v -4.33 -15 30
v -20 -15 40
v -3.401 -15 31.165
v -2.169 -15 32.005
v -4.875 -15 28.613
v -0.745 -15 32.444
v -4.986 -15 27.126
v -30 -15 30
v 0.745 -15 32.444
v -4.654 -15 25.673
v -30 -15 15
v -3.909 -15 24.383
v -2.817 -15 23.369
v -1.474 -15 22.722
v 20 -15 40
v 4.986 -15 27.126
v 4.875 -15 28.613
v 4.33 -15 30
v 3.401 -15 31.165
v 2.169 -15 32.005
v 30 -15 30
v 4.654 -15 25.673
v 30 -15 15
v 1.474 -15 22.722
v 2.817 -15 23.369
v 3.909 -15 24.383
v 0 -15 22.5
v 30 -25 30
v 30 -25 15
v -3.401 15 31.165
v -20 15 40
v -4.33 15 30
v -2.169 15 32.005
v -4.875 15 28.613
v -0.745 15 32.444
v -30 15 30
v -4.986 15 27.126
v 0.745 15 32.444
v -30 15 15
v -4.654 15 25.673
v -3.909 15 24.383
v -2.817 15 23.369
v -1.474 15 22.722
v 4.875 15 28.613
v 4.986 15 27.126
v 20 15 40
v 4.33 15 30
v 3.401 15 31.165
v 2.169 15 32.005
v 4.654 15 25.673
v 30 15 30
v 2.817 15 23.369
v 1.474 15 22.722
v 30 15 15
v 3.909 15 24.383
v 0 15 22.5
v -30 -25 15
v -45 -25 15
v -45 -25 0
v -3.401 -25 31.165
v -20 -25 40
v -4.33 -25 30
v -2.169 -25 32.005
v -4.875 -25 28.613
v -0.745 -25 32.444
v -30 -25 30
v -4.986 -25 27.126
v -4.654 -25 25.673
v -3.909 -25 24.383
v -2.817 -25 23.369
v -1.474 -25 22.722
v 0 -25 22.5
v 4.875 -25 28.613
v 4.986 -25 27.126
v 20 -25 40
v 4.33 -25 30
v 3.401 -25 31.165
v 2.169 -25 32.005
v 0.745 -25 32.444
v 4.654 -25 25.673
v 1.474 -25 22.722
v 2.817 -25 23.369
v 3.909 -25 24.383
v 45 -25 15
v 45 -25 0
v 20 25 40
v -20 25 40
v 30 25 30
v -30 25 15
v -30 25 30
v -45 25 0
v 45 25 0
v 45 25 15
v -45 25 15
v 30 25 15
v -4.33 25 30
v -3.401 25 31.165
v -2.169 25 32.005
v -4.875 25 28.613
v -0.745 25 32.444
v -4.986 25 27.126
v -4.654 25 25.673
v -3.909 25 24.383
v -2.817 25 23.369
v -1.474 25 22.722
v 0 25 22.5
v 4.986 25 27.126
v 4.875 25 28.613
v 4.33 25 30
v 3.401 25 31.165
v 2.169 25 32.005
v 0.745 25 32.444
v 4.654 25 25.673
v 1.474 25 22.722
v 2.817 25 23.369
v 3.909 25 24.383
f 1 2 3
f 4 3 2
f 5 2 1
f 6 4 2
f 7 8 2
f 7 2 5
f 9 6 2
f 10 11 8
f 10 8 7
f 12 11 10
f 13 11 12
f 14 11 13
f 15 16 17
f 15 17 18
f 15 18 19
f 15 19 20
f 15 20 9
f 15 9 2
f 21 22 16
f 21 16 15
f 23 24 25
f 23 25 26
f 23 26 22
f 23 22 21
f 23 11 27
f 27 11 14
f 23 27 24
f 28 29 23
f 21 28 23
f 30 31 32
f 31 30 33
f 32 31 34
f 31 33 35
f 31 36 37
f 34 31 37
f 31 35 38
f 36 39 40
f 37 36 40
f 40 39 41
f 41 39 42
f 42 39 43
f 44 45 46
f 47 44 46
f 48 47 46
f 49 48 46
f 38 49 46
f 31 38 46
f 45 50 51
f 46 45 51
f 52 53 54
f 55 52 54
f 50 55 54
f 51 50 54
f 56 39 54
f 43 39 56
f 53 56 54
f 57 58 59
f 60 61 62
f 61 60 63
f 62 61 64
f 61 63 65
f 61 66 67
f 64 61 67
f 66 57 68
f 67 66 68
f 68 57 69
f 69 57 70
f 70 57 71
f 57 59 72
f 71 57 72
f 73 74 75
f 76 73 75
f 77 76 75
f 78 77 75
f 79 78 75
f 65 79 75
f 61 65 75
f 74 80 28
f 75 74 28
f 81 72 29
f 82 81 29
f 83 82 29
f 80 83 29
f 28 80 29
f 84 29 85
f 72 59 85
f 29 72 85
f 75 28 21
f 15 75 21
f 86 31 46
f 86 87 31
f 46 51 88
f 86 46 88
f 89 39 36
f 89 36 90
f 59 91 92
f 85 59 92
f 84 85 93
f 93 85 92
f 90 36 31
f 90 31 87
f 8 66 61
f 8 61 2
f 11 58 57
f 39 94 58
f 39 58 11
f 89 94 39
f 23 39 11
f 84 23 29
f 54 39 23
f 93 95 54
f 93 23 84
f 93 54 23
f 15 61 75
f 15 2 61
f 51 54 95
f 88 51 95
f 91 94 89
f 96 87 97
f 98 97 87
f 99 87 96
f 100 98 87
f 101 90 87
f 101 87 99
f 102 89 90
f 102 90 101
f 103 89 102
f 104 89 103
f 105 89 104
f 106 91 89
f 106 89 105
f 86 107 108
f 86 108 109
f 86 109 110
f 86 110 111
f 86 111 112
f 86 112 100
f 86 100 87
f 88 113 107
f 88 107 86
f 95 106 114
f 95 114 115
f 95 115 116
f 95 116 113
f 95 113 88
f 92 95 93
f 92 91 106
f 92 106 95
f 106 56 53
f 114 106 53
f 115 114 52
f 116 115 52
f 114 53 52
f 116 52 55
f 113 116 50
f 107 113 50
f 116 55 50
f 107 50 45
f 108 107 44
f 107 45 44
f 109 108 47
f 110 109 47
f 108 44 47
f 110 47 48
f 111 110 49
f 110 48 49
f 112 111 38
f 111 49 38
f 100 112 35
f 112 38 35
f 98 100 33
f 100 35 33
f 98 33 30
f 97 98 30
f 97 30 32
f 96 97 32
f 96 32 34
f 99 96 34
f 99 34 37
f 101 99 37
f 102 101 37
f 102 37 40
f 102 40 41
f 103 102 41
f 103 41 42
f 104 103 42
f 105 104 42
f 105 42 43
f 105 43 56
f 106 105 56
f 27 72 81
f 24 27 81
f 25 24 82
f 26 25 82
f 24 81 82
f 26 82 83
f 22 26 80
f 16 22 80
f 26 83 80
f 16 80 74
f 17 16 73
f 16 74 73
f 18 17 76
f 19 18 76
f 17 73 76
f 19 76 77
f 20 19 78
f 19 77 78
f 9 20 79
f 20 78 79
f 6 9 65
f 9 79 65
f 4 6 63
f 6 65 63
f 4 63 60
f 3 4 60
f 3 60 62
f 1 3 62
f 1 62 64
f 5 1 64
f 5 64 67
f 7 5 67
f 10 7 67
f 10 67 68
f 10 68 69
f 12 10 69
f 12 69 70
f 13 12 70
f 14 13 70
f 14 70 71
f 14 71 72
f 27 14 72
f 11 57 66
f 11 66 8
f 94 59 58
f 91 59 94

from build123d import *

# Parameters (mm, degrees)
SKETCH3_W           = 90
SKETCH3_H           = 50
BOSS_EXTRUDE4_DEPTH = 15
SKETCH4_W           = 60
SKETCH4_H           = 10
BOSS_EXTRUDE5_DEPTH = 25
SKETCH5_R           = 5
CUT_EXTRUDE1_DEPTH  = 79.262379212
FILLET1_SIZE        = 10


with BuildPart() as part:
    # Sketch3 → Boss-Extrude4 (new body)
    with BuildSketch(Plane.XY):
        Rectangle(SKETCH3_W, SKETCH3_H)
    extrude(amount=BOSS_EXTRUDE4_DEPTH)

    # Sketch4 → Boss-Extrude5 (add)
    with BuildSketch(Plane.XY.offset(15)):
        with Locations((0, 20)):
            Rectangle(SKETCH4_W, SKETCH4_H)
        with Locations((0, -20)):
            Rectangle(SKETCH4_W, SKETCH4_H)
    extrude(amount=BOSS_EXTRUDE5_DEPTH)

    # Sketch5 → Cut-Extrude1 (cut, through all)
    with BuildSketch(Plane.XZ.offset(25)):
        with Locations(Location((0, 27.5, 0), (0, 0, 270))):
            Circle(SKETCH5_R)
    extrude(amount=-CUT_EXTRUDE1_DEPTH, mode=Mode.SUBTRACT)

    # Fillet1
    fillet1_edges = [part.edges().sort_by_distance(p)[0] for p in [
        (-30, 20, 40),
        (30, 20, 40),
        (30, -20, 40),
        (-30, -20, 40),
    ]]
    chamfer(fillet1_edges, length=FILLET1_SIZE)


solid = part.part
